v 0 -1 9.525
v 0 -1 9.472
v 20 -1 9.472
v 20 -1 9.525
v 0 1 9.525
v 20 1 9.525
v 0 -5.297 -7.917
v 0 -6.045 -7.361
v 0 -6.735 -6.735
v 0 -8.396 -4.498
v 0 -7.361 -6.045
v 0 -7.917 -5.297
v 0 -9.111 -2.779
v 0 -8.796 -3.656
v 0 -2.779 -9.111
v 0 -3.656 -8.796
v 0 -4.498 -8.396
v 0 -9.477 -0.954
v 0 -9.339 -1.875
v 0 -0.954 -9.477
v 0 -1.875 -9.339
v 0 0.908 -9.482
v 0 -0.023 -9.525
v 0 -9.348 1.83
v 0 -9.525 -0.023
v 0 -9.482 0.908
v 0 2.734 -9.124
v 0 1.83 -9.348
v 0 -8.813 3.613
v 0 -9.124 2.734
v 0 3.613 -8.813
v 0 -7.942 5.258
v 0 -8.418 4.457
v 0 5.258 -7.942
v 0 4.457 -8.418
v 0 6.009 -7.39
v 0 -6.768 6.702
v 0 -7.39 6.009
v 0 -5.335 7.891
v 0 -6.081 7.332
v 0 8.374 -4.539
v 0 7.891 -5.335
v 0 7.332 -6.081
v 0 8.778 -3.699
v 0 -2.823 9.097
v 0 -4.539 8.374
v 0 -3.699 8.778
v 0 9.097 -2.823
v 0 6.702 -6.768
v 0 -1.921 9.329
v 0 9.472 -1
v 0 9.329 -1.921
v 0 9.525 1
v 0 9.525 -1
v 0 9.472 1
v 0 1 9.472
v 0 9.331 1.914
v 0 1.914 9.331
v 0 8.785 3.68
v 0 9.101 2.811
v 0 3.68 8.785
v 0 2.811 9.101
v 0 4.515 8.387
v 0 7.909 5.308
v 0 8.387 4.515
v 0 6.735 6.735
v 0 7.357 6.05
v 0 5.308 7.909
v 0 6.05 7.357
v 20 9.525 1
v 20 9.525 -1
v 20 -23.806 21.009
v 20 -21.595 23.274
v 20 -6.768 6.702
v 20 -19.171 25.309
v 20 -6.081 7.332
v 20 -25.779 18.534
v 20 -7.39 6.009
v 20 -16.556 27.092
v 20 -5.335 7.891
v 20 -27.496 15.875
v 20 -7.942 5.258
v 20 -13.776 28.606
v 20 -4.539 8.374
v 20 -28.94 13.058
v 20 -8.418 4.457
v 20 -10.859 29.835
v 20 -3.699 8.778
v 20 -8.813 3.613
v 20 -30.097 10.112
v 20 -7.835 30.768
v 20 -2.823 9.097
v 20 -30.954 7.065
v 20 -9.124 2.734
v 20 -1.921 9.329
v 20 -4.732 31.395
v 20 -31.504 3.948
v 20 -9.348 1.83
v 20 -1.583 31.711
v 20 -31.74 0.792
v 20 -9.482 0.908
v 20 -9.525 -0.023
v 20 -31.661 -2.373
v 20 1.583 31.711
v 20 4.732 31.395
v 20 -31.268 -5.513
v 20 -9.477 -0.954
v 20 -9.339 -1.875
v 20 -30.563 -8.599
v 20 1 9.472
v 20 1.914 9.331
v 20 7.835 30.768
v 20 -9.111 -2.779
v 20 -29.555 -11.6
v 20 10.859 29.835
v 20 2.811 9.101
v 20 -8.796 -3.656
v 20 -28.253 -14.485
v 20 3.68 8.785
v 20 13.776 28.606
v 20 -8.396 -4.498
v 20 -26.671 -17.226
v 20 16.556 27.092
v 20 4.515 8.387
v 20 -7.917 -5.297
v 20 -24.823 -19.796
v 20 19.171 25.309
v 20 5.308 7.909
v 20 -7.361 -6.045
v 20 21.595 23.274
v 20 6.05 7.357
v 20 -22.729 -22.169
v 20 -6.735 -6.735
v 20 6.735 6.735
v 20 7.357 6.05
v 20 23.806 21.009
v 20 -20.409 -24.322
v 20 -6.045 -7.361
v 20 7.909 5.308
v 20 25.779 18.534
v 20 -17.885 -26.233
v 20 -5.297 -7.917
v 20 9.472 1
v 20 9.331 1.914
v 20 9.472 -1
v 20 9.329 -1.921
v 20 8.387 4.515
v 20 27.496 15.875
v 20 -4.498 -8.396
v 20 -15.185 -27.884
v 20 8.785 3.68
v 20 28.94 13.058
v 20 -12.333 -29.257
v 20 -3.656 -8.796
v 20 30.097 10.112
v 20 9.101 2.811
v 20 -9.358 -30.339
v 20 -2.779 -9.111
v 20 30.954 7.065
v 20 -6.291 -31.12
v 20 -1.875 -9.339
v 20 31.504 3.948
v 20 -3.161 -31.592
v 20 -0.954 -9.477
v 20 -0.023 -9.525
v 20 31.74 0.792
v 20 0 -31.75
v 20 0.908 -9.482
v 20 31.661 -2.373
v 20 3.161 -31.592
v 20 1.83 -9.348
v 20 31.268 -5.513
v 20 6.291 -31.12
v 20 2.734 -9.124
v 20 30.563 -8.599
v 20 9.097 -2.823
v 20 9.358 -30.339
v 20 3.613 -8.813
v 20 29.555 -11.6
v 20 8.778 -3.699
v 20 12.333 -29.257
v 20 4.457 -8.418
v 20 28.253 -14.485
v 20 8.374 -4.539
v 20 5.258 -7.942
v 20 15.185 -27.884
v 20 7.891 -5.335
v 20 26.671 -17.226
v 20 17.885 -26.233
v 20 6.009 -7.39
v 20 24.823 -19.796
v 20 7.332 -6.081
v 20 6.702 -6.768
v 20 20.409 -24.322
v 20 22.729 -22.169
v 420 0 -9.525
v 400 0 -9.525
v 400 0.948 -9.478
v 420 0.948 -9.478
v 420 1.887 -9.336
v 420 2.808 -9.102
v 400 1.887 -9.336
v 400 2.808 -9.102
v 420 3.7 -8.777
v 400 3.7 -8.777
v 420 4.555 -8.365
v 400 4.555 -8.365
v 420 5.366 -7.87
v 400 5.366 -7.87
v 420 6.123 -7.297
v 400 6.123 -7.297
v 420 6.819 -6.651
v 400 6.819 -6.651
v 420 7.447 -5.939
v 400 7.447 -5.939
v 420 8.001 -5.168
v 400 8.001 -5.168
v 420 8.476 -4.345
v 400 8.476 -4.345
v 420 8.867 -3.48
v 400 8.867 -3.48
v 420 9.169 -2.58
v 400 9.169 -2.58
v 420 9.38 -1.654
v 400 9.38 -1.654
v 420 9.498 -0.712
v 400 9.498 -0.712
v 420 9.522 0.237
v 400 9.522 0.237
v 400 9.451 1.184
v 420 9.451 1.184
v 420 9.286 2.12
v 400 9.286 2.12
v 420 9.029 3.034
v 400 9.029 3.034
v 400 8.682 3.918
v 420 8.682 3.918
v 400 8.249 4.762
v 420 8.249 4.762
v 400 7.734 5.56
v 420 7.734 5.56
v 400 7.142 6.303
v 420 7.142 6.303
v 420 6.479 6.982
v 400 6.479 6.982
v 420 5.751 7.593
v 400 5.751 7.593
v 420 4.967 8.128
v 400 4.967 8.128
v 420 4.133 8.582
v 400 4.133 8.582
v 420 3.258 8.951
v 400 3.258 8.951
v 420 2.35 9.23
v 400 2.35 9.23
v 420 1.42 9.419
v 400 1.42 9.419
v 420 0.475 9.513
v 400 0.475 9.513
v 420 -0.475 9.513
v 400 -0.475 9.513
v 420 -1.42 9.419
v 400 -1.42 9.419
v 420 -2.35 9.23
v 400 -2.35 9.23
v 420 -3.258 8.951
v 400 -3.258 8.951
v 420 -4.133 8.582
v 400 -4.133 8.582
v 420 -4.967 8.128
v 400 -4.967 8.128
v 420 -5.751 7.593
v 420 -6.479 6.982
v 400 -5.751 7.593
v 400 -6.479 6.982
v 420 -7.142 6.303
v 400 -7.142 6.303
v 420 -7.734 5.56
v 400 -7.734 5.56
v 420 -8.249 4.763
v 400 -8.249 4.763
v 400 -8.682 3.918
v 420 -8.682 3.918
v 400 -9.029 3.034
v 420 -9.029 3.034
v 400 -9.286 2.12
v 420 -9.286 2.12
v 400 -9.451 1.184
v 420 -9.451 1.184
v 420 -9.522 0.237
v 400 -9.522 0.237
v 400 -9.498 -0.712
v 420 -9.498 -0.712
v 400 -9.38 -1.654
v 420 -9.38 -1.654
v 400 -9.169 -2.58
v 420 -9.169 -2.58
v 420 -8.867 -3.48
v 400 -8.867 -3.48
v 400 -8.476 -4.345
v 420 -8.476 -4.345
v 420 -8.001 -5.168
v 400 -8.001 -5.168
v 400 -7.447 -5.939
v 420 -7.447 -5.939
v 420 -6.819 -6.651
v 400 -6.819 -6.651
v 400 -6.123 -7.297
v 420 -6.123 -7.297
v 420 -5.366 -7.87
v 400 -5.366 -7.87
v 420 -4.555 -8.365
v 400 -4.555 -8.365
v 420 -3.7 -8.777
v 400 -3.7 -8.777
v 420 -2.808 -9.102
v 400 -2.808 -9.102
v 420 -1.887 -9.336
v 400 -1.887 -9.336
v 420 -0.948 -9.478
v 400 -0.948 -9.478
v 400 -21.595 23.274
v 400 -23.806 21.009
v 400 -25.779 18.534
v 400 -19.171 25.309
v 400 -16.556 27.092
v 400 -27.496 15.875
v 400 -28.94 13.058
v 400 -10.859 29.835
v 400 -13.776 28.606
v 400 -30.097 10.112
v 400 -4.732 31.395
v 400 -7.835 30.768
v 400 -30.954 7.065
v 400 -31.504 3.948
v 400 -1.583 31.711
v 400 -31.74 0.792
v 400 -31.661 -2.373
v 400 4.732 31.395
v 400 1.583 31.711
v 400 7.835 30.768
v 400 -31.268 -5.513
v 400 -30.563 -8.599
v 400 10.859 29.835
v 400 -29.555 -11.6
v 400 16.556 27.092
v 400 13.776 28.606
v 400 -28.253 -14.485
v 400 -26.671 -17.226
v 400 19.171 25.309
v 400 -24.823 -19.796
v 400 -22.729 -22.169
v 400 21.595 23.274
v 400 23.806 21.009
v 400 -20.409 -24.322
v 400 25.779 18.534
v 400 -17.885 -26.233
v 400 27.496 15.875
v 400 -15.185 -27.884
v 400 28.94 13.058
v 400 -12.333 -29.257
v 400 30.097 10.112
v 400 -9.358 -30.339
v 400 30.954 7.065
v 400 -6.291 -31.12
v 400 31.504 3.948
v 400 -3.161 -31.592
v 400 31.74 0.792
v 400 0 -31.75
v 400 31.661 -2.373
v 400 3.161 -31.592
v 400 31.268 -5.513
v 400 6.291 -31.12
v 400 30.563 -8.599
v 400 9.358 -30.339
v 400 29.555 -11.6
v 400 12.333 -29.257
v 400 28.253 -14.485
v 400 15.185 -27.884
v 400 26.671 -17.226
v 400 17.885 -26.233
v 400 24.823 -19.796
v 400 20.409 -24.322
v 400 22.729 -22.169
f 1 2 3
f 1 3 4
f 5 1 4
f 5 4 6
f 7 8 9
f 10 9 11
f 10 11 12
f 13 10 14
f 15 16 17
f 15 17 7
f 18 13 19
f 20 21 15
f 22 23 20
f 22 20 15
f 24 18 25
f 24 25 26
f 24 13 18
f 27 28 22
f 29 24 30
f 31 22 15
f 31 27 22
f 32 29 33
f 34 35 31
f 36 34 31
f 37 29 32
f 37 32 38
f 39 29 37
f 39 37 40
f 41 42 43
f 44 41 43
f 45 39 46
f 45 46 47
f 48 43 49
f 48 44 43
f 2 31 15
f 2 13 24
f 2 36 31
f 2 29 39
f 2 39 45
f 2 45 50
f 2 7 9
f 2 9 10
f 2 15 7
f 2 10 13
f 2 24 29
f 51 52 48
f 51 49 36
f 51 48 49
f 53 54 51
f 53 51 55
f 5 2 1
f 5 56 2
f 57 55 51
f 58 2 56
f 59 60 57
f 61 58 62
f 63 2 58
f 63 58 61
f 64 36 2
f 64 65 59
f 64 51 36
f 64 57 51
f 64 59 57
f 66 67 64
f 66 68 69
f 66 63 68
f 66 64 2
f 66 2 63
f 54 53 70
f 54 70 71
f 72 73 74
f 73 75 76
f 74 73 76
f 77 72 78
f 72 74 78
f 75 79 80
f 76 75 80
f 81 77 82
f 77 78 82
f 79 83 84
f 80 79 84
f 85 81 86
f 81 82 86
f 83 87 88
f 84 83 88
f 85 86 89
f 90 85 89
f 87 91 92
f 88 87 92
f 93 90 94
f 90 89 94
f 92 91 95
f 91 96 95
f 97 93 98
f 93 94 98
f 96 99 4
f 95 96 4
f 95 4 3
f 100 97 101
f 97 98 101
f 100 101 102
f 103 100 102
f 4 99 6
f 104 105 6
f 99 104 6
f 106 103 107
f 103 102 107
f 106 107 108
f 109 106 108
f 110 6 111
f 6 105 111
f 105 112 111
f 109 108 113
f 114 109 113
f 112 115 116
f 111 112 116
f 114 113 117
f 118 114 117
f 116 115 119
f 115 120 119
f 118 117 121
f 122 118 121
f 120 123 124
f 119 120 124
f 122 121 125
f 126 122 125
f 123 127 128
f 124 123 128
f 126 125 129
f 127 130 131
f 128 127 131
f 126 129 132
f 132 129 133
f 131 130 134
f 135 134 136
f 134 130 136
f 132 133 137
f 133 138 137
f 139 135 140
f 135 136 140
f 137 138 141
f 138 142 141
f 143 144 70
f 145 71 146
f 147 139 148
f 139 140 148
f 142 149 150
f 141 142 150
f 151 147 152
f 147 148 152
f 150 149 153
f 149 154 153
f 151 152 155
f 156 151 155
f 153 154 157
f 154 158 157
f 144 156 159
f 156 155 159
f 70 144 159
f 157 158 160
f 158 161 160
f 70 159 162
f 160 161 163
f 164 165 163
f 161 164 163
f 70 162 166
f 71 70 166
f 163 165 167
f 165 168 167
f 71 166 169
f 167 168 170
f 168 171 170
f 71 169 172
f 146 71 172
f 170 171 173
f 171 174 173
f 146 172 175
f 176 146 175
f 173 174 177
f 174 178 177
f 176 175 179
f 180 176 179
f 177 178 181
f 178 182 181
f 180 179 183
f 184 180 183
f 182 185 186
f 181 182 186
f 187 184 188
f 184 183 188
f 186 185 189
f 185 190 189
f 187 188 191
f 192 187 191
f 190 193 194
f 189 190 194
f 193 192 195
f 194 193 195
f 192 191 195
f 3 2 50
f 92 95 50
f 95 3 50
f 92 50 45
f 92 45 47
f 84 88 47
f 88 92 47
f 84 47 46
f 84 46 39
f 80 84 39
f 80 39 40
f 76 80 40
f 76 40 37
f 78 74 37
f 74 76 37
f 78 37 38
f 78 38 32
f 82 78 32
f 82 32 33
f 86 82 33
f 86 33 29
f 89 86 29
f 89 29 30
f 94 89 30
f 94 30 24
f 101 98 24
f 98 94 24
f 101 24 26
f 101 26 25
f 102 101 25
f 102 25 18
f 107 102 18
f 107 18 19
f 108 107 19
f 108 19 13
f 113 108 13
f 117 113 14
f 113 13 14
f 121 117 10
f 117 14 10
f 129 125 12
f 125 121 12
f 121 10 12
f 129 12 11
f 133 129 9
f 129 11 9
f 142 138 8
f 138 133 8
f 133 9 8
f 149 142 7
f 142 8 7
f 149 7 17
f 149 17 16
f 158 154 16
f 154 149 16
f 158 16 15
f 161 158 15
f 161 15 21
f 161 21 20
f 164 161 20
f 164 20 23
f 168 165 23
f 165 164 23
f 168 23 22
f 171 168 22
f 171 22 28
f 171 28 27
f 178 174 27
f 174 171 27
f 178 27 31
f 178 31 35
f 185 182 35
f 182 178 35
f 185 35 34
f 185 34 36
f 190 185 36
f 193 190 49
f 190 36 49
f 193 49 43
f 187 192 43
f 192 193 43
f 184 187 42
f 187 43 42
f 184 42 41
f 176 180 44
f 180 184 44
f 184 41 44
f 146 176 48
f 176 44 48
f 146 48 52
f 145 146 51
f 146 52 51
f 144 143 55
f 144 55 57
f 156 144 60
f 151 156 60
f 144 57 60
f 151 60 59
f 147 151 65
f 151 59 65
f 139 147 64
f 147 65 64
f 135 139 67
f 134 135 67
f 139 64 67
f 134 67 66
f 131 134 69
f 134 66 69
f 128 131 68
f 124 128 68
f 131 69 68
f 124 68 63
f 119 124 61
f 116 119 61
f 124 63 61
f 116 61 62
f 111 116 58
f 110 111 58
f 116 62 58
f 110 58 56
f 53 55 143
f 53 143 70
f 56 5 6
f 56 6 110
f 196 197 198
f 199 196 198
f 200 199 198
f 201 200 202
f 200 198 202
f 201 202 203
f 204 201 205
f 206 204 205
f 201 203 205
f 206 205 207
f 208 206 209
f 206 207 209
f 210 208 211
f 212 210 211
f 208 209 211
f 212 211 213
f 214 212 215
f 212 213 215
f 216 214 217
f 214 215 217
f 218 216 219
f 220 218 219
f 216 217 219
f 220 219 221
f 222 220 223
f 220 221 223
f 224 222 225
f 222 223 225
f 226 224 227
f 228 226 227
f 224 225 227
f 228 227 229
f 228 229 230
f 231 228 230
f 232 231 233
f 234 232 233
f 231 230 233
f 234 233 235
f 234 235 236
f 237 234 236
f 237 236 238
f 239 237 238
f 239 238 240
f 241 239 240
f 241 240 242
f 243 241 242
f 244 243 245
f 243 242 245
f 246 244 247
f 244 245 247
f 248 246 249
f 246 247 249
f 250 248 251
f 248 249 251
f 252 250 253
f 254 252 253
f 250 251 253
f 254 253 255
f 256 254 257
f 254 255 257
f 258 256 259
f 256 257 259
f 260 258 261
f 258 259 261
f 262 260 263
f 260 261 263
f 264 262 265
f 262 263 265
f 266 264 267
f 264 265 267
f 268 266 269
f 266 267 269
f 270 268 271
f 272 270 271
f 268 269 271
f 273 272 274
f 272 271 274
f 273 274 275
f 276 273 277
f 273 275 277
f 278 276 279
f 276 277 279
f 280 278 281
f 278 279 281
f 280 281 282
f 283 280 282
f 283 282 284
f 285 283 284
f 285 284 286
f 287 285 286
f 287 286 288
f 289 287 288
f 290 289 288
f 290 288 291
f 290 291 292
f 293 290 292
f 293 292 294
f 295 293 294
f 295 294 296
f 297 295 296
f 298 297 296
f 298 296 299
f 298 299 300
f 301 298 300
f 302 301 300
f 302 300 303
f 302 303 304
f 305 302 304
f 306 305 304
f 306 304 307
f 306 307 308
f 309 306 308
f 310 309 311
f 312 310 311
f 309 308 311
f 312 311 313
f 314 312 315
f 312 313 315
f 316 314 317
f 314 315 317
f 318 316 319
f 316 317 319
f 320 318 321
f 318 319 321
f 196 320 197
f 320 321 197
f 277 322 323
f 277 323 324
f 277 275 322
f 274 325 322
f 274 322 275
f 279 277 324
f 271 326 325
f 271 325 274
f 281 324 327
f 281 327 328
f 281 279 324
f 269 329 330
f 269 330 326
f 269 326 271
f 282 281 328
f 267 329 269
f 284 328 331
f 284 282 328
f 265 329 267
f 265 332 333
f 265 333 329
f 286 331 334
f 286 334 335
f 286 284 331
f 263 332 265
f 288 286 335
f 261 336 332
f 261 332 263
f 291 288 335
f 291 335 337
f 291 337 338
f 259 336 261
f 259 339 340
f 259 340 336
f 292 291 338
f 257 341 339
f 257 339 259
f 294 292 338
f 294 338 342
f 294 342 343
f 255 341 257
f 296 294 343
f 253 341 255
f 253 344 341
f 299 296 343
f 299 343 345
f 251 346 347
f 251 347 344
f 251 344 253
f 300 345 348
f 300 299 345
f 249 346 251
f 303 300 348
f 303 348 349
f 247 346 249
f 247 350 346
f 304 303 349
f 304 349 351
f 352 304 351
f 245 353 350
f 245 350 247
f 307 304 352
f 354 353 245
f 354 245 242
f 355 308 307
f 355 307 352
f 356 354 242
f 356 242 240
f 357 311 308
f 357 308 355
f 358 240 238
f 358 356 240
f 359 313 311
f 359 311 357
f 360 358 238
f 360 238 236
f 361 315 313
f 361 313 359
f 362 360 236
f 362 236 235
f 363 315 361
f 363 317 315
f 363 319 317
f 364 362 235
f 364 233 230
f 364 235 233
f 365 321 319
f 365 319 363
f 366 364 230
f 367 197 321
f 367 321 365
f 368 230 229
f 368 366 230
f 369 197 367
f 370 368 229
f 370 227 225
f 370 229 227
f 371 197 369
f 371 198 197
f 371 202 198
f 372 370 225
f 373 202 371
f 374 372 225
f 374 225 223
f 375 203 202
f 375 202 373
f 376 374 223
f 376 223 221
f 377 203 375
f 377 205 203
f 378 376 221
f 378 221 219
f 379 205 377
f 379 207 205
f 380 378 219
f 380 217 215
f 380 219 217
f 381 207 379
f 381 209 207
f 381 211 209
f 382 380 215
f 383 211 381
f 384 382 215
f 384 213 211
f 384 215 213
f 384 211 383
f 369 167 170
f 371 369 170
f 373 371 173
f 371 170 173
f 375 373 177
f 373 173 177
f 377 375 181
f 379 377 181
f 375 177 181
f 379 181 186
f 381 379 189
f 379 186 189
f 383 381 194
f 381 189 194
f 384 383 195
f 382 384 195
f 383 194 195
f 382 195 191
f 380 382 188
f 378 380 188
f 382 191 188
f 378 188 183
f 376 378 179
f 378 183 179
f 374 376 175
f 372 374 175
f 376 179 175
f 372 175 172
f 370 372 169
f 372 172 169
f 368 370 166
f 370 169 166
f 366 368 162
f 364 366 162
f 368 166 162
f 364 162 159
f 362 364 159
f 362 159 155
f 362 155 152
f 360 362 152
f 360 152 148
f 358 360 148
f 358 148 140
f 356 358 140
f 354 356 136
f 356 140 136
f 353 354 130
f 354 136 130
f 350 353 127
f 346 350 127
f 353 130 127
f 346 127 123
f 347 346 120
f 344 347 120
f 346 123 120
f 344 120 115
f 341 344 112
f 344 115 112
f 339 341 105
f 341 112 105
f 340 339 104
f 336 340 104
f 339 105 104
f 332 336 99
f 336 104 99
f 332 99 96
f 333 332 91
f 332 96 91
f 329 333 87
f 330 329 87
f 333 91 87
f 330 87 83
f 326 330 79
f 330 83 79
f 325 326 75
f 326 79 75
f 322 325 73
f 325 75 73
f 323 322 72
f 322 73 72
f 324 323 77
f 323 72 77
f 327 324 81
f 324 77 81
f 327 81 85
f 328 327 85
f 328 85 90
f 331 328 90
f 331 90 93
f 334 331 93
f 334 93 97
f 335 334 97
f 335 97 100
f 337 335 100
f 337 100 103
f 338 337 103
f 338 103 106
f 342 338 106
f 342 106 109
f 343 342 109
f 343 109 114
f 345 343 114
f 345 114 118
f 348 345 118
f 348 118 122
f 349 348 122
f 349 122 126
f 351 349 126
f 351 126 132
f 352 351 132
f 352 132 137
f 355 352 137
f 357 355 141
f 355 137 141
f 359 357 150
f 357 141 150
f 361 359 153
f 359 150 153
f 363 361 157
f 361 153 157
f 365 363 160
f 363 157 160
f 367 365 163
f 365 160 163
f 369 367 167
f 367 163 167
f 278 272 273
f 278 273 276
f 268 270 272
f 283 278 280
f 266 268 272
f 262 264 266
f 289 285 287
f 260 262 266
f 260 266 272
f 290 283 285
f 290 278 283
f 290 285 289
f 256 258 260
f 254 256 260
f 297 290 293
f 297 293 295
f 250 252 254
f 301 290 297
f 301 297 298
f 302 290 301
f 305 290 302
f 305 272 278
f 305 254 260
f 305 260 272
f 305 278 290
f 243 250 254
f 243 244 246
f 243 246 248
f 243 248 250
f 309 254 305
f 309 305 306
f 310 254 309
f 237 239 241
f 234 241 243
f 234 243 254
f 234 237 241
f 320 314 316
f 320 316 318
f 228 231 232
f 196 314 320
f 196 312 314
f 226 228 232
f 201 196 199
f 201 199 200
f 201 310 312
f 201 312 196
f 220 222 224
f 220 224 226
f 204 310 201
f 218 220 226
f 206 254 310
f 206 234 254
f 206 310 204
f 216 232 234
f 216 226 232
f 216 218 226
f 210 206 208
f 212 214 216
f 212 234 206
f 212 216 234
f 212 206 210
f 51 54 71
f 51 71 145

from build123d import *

# Parameters (mm, degrees)
CROQUIS1_R              = 9.525
SALIENTE_EXTRUIR1_DEPTH = 20
CROQUIS2_R              = 31.75
SALIENTE_EXTRUIR2_DEPTH = 380
CROQUIS3_R              = 9.525
SALIENTE_EXTRUIR3_DEPTH = 20
SALIENTE_EXTRUIR4_DEPTH = 20


with BuildPart() as part:
    # Croquis1 → Saliente-Extruir1 (new body)
    with BuildSketch(Plane(origin=(0, 0, 0), x_dir=(0, 0, -1), z_dir=(1, 0, 0))):
        Circle(CROQUIS1_R)
    extrude(amount=SALIENTE_EXTRUIR1_DEPTH)

    # Croquis2 → Saliente-Extruir2 (add)
    with BuildSketch(Plane(origin=(20, 0, 0), x_dir=(0, 0, -1), z_dir=(1, 0, 0))):
        Circle(CROQUIS2_R)
    extrude(amount=SALIENTE_EXTRUIR2_DEPTH)

    # Croquis3 → Saliente-Extruir3 (add)
    with BuildSketch(Plane(origin=(400, 0, 0), x_dir=(0, 0, -1), z_dir=(1, 0, 0))):
        Circle(CROQUIS3_R)
    extrude(amount=SALIENTE_EXTRUIR3_DEPTH)

    # Croquis4 → Saliente-Extruir4 (add)
    with BuildSketch(Plane.ZY):
        Polygon((0, 9.525), (-1, 9.525), (-1, 8.525), (1, 8.525), (1, 9.525), align=None)
        Polygon((9.525, 0), (9.525, 1), (8.525, 1), (8.525, -1), (9.525, -1), align=None)
    extrude(amount=-SALIENTE_EXTRUIR4_DEPTH)


solid = part.part
